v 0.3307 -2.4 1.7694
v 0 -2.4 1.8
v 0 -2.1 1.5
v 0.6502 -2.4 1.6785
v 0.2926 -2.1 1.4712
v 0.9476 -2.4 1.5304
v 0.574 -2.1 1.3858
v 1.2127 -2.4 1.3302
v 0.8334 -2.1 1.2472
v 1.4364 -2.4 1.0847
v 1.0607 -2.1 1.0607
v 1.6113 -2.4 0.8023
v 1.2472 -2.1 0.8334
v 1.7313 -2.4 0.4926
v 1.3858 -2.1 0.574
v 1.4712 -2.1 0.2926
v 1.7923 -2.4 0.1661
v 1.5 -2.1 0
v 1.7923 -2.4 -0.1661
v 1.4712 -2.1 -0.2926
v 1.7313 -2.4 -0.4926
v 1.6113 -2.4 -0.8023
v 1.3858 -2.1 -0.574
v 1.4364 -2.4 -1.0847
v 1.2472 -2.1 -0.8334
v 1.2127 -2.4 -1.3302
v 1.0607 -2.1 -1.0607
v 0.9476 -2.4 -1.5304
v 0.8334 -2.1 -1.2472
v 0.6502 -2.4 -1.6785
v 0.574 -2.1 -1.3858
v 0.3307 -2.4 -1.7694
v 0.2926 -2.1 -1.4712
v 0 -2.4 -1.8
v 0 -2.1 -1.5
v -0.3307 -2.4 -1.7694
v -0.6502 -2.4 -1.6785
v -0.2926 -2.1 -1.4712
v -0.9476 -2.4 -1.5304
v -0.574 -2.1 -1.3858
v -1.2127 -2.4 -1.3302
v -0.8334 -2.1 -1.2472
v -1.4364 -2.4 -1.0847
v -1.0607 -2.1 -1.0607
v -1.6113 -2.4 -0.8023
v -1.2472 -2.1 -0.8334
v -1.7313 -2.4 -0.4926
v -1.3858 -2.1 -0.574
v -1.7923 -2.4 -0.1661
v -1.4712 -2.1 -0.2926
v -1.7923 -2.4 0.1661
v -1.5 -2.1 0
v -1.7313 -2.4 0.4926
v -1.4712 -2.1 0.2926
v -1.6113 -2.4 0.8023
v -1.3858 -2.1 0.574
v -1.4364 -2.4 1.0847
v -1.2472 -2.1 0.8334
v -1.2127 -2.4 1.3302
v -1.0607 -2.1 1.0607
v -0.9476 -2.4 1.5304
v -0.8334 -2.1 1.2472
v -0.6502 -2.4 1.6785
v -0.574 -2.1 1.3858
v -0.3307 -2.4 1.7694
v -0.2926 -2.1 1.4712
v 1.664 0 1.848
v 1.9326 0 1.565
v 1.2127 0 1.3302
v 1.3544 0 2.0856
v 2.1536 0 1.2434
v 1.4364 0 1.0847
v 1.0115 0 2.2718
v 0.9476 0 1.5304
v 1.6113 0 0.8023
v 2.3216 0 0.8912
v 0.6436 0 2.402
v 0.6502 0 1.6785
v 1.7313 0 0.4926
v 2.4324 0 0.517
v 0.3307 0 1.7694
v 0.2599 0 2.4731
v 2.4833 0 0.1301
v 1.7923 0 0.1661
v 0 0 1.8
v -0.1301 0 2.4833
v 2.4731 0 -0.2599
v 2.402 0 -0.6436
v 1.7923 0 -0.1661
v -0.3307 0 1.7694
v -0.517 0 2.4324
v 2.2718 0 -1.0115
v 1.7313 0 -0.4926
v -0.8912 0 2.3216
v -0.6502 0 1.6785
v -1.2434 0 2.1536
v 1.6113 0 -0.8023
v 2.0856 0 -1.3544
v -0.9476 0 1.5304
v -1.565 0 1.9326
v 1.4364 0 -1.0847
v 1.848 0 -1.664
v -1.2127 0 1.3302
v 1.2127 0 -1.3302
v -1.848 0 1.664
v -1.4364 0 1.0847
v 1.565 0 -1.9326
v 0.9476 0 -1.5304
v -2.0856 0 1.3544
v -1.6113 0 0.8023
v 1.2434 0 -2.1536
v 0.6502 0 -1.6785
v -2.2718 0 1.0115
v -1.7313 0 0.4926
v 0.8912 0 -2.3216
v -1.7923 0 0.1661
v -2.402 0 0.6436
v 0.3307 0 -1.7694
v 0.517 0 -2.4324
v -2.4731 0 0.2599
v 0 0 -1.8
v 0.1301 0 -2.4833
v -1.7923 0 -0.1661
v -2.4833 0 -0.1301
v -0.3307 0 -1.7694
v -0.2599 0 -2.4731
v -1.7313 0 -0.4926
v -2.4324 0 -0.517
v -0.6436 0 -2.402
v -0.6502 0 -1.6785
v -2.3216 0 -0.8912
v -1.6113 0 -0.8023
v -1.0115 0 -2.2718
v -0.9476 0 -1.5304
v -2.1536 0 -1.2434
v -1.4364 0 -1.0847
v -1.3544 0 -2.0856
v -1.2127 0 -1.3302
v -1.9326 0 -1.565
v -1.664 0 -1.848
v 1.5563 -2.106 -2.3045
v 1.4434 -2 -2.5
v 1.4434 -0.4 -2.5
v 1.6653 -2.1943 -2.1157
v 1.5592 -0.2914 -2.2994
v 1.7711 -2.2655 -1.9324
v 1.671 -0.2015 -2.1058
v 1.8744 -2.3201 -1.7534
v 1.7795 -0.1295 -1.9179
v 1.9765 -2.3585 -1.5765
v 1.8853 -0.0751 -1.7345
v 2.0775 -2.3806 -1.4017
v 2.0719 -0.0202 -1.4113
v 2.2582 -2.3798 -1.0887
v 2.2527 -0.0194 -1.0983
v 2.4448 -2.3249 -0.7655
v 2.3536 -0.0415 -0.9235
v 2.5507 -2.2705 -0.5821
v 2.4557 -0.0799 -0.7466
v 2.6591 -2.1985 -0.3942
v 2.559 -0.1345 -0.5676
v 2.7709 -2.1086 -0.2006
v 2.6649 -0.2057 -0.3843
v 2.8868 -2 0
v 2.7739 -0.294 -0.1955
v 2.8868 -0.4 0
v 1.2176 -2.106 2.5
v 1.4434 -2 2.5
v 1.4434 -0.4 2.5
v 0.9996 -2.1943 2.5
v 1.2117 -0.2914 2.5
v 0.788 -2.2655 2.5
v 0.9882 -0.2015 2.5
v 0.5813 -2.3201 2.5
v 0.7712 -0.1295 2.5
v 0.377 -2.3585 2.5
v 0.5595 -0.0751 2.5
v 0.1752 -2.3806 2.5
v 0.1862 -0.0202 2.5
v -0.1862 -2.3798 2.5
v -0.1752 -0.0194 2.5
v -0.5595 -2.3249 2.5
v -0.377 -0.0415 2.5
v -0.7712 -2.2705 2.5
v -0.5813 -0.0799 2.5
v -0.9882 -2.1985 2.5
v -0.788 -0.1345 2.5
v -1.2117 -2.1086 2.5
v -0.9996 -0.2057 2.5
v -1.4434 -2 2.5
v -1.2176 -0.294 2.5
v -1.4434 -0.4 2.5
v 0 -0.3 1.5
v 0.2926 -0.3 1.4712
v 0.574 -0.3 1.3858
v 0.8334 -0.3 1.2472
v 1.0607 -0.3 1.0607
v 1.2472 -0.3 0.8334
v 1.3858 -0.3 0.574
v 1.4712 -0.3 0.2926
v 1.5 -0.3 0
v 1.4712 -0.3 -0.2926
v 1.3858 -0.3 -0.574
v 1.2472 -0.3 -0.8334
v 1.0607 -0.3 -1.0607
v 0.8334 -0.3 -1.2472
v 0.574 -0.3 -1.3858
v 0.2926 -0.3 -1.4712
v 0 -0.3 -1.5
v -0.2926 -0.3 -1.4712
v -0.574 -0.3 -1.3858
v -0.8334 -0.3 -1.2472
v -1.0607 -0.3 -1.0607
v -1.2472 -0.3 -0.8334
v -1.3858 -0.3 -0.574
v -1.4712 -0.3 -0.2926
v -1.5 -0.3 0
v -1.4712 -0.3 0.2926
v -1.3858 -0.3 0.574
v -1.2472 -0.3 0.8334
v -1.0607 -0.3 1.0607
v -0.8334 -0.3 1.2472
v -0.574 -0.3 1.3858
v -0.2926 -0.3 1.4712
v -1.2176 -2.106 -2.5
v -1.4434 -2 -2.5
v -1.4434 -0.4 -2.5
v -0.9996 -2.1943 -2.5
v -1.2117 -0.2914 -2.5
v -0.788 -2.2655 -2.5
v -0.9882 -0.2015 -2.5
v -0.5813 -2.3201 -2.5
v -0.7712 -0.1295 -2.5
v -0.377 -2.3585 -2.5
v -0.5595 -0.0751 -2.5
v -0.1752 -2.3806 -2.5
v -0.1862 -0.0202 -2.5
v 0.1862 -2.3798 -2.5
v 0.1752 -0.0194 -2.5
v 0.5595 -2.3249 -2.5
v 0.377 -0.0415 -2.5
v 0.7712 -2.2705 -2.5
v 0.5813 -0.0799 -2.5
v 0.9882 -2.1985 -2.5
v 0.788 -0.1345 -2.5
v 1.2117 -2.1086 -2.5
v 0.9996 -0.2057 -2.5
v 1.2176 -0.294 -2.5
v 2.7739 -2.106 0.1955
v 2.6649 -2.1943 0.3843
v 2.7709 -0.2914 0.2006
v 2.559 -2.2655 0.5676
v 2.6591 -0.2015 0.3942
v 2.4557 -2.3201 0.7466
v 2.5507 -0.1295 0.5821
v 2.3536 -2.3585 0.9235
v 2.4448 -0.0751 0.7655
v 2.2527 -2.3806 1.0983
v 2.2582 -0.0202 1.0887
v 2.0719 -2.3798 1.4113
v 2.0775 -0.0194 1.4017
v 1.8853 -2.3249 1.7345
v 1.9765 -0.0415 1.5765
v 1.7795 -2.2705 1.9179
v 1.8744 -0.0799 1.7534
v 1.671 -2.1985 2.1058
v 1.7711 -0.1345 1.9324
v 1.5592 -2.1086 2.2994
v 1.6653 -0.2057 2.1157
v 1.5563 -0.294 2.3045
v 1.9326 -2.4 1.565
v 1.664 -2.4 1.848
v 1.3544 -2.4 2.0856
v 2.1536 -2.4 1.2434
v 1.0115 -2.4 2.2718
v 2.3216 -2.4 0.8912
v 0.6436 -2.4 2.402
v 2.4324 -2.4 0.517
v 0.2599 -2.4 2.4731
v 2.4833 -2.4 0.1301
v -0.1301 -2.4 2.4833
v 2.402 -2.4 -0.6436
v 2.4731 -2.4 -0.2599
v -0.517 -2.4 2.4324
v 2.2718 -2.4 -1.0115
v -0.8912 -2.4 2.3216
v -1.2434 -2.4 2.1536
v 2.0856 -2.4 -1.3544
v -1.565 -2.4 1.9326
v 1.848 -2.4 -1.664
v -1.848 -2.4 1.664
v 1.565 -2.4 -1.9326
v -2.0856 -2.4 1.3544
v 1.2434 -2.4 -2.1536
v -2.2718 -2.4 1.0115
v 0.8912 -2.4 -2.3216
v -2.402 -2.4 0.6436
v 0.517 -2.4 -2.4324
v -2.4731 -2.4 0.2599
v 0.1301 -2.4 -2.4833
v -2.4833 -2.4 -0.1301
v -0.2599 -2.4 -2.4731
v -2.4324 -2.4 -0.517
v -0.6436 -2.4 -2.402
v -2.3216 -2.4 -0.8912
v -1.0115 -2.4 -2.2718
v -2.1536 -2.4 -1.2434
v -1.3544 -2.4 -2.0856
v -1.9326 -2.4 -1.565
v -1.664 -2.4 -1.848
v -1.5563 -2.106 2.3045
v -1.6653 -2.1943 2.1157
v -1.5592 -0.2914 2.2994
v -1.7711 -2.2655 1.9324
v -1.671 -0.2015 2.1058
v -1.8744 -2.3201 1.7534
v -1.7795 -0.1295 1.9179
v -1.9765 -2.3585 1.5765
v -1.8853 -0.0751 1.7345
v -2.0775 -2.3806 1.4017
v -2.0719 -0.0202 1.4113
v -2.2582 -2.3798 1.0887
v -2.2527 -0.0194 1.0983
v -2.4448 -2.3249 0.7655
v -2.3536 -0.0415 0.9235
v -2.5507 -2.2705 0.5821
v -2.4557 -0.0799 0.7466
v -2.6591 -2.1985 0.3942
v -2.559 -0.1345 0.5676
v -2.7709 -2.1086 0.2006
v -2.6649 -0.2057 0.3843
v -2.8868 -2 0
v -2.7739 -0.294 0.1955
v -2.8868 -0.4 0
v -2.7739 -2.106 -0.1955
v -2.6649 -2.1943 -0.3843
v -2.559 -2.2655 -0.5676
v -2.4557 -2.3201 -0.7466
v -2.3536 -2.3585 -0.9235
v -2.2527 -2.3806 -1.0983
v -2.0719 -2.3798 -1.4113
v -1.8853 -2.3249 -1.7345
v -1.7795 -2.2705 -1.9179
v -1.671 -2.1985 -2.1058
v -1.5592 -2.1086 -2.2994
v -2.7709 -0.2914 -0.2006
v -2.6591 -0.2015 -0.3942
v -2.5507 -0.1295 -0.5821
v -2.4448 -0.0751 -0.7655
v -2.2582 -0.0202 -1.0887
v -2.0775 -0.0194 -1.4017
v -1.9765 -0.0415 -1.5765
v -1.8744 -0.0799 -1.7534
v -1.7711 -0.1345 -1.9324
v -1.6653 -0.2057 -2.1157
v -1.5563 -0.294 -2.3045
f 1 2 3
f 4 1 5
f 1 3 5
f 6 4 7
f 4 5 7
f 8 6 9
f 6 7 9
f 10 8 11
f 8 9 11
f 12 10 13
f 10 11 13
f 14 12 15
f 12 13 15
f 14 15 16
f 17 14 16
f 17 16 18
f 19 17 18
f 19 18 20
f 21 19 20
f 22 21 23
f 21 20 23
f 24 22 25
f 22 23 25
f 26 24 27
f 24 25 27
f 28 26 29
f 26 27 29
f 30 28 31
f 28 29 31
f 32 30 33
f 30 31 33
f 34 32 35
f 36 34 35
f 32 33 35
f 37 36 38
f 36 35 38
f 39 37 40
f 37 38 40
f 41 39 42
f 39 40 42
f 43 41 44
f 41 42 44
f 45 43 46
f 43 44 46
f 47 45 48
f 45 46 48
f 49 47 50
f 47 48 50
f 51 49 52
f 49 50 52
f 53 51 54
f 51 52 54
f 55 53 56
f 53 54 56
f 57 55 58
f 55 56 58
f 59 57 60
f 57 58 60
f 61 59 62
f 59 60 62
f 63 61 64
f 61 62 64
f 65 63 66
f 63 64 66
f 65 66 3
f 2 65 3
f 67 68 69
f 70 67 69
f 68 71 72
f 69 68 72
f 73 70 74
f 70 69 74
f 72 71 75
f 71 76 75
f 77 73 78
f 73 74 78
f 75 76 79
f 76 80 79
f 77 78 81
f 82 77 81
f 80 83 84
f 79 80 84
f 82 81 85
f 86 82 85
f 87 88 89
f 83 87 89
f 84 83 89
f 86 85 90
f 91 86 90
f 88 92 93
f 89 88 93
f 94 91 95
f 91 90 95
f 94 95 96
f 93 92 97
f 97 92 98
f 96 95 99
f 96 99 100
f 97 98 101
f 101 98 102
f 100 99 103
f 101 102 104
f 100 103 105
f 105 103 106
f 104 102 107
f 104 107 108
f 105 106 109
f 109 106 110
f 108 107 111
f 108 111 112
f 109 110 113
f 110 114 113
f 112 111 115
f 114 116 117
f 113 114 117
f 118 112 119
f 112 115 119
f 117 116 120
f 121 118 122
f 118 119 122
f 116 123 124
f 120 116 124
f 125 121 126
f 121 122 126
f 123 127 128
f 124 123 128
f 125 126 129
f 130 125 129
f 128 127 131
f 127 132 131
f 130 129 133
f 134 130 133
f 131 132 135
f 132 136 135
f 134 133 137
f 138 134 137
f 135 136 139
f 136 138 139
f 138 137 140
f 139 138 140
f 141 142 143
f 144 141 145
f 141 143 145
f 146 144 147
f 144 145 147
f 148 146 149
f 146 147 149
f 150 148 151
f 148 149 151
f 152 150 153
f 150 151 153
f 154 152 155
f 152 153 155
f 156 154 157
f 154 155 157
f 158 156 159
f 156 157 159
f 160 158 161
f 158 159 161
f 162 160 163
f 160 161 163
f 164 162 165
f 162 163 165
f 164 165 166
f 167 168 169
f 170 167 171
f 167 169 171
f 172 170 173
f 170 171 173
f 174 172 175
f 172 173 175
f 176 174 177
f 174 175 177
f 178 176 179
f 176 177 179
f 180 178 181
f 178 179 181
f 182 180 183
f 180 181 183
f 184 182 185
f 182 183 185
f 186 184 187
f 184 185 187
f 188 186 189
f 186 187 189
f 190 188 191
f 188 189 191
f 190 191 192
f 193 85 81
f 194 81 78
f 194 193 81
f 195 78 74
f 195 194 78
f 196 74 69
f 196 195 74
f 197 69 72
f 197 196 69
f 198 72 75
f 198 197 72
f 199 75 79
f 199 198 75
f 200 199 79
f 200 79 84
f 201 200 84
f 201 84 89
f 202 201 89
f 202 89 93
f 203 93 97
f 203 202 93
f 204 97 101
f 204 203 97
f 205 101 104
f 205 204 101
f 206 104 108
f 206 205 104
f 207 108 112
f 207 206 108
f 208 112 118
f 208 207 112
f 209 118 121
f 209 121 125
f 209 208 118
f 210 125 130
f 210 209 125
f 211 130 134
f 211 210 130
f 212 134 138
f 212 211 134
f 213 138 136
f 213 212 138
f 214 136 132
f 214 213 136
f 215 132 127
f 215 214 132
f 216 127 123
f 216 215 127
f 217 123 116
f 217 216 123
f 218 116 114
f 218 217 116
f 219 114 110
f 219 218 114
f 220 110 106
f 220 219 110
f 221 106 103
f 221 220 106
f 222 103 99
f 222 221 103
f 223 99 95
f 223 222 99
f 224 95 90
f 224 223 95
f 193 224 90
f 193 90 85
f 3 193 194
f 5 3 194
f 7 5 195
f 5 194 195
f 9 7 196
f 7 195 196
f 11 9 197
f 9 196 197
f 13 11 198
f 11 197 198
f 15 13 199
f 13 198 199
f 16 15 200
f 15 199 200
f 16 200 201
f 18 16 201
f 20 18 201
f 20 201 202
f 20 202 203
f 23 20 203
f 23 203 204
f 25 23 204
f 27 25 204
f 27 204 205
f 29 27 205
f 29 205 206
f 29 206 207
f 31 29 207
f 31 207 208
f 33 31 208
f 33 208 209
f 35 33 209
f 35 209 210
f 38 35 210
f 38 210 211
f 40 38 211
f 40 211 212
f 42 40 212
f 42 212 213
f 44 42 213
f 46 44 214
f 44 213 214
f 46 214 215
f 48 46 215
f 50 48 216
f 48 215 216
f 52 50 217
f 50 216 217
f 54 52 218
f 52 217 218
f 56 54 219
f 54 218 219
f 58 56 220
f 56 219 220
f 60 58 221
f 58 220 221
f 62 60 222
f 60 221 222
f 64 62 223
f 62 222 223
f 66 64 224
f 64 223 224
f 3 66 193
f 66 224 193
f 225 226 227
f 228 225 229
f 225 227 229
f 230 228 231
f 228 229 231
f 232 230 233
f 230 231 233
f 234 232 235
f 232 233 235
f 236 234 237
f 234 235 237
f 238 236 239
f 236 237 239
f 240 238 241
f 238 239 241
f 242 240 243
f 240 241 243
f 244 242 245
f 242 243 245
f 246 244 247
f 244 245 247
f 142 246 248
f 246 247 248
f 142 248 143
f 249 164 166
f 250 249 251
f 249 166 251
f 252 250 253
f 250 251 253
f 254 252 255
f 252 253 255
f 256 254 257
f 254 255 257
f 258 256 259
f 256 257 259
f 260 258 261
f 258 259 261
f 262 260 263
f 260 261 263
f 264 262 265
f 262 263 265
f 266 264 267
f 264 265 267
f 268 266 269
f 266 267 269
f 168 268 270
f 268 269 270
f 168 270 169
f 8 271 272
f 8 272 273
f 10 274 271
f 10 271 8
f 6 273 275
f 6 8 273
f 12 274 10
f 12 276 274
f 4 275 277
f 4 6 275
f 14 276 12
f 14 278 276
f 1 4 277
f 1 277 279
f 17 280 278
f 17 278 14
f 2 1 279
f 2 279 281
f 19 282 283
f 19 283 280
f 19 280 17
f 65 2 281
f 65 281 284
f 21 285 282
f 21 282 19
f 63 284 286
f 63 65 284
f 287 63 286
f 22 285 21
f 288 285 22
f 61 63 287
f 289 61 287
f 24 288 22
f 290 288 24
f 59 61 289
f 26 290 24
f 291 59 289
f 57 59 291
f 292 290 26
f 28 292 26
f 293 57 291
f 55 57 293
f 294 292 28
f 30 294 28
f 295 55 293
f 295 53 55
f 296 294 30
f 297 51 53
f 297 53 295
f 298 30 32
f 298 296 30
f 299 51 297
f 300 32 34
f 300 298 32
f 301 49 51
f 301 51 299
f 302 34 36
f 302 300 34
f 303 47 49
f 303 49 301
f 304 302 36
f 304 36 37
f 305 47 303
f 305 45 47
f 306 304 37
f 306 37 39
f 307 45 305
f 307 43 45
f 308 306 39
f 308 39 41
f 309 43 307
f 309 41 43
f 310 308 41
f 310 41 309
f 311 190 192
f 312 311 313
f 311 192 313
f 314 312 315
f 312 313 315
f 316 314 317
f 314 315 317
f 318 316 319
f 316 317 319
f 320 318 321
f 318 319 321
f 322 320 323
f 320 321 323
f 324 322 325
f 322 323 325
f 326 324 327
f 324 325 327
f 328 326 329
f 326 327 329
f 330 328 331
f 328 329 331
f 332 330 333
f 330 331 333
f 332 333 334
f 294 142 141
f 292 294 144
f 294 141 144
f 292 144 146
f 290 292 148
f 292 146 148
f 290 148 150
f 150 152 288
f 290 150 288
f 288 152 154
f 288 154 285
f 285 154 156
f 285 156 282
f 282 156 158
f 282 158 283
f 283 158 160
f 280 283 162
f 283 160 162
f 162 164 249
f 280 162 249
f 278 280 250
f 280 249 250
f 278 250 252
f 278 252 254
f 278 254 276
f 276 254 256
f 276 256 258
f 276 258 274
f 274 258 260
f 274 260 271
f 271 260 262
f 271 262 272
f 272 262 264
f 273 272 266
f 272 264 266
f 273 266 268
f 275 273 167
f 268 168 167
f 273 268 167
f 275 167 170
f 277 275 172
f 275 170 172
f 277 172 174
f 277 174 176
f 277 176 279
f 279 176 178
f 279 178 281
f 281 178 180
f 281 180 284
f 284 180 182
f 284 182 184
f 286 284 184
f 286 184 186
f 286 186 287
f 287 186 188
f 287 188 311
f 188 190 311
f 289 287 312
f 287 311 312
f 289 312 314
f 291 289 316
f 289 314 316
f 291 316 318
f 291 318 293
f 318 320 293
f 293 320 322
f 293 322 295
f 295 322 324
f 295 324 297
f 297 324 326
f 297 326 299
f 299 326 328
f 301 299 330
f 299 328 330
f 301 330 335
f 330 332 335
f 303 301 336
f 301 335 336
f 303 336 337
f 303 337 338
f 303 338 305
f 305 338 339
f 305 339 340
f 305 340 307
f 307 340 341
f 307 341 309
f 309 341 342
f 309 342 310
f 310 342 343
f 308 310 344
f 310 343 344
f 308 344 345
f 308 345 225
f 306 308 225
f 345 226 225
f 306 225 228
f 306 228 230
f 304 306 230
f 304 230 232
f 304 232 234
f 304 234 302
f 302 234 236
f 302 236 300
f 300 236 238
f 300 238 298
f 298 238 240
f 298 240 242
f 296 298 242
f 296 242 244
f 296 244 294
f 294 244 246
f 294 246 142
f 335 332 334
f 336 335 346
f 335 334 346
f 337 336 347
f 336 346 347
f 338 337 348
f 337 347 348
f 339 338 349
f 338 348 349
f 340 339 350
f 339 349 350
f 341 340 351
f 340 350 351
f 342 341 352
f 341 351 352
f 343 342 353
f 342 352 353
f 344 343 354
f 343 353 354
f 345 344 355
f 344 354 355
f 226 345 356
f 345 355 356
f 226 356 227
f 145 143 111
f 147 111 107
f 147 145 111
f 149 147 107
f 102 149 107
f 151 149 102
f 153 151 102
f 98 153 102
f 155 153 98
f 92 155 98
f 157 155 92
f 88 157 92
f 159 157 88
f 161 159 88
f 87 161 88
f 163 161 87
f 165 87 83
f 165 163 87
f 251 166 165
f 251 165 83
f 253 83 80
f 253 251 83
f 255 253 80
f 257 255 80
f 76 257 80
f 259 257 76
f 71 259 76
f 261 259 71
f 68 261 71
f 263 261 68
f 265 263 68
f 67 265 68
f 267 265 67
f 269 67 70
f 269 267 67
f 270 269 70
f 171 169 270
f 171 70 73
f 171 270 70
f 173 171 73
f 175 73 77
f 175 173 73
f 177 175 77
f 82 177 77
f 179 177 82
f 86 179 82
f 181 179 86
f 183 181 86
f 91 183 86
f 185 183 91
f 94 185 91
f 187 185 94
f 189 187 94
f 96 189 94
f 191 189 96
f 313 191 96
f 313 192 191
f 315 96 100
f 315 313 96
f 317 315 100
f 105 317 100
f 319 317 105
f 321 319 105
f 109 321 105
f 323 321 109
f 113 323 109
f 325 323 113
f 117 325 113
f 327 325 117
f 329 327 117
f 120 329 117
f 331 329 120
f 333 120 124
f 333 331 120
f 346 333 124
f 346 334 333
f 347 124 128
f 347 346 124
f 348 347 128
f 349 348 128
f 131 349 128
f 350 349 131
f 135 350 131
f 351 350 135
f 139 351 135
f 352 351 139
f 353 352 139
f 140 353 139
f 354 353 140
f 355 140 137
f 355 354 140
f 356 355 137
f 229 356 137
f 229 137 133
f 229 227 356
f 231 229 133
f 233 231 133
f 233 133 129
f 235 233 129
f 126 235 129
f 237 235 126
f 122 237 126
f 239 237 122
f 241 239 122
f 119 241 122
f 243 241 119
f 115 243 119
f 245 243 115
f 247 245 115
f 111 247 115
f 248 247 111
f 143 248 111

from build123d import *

# Parameters (mm, degrees)
EXTRUDE_1_DEPTH     = 2.4
SKETCH_2_R          = 1.5
CUT_EXTRUDE_1_DEPTH = 5.510358448
CHAMFER_1_SIZE      = 0.3


with BuildPart() as part:
    # Эскиз1 → Вытянуть1 (new body)
    with BuildSketch(Plane(origin=(0, 0, 0), x_dir=(1, 0, 0), z_dir=(0, 1, 0))):
        Polygon((-1.443375673, 2.5), (1.443375673, 2.5), (2.886751346, 0), (1.443375673, -2.5), (-1.443375673, -2.5), (-2.886751346, 0), align=None)
    extrude(amount=-EXTRUDE_1_DEPTH)

    # Эскиз2 → Вырез-Вытянуть1 (cut, through all)
    with BuildSketch(Plane(origin=(0, 0, 0), x_dir=(-1, 0, 0), z_dir=(0, 1, 0))):
        with Locations(Location((0, 0, 0), (0, 0, 90))):
            Circle(SKETCH_2_R)
    extrude(amount=-CUT_EXTRUDE_1_DEPTH, mode=Mode.SUBTRACT)

    # Фаска1
    chamfer_1_edges = [part.edges().sort_by_distance(p)[0] for p in [
        (0, -2.4, -1.5),
        (0, 0, -1.5),
    ]]
    chamfer(chamfer_1_edges, length=CHAMFER_1_SIZE)

    # Эскиз3 → Вырез-Повернуть1 (revolve, cut)
    with BuildSketch(Plane.XY, mode=Mode.PRIVATE) as cut_revolve_1_sk:
        Polygon((-2.886751346, 0), (-2.486751346, 0), (-2.886751346, -0.4), align=None)
        Polygon((-2.886751346, -2), (-2.886751346, -2.4), (-2.486751346, -2.4), align=None)
    revolve(cut_revolve_1_sk.sketch.rotate(Axis((0, -0.3, 0), (0, -1, 0)), 120.000000241), axis=Axis((0, -0.3, 0), (0, -1, 0)), mode=Mode.SUBTRACT)


solid = part.part
